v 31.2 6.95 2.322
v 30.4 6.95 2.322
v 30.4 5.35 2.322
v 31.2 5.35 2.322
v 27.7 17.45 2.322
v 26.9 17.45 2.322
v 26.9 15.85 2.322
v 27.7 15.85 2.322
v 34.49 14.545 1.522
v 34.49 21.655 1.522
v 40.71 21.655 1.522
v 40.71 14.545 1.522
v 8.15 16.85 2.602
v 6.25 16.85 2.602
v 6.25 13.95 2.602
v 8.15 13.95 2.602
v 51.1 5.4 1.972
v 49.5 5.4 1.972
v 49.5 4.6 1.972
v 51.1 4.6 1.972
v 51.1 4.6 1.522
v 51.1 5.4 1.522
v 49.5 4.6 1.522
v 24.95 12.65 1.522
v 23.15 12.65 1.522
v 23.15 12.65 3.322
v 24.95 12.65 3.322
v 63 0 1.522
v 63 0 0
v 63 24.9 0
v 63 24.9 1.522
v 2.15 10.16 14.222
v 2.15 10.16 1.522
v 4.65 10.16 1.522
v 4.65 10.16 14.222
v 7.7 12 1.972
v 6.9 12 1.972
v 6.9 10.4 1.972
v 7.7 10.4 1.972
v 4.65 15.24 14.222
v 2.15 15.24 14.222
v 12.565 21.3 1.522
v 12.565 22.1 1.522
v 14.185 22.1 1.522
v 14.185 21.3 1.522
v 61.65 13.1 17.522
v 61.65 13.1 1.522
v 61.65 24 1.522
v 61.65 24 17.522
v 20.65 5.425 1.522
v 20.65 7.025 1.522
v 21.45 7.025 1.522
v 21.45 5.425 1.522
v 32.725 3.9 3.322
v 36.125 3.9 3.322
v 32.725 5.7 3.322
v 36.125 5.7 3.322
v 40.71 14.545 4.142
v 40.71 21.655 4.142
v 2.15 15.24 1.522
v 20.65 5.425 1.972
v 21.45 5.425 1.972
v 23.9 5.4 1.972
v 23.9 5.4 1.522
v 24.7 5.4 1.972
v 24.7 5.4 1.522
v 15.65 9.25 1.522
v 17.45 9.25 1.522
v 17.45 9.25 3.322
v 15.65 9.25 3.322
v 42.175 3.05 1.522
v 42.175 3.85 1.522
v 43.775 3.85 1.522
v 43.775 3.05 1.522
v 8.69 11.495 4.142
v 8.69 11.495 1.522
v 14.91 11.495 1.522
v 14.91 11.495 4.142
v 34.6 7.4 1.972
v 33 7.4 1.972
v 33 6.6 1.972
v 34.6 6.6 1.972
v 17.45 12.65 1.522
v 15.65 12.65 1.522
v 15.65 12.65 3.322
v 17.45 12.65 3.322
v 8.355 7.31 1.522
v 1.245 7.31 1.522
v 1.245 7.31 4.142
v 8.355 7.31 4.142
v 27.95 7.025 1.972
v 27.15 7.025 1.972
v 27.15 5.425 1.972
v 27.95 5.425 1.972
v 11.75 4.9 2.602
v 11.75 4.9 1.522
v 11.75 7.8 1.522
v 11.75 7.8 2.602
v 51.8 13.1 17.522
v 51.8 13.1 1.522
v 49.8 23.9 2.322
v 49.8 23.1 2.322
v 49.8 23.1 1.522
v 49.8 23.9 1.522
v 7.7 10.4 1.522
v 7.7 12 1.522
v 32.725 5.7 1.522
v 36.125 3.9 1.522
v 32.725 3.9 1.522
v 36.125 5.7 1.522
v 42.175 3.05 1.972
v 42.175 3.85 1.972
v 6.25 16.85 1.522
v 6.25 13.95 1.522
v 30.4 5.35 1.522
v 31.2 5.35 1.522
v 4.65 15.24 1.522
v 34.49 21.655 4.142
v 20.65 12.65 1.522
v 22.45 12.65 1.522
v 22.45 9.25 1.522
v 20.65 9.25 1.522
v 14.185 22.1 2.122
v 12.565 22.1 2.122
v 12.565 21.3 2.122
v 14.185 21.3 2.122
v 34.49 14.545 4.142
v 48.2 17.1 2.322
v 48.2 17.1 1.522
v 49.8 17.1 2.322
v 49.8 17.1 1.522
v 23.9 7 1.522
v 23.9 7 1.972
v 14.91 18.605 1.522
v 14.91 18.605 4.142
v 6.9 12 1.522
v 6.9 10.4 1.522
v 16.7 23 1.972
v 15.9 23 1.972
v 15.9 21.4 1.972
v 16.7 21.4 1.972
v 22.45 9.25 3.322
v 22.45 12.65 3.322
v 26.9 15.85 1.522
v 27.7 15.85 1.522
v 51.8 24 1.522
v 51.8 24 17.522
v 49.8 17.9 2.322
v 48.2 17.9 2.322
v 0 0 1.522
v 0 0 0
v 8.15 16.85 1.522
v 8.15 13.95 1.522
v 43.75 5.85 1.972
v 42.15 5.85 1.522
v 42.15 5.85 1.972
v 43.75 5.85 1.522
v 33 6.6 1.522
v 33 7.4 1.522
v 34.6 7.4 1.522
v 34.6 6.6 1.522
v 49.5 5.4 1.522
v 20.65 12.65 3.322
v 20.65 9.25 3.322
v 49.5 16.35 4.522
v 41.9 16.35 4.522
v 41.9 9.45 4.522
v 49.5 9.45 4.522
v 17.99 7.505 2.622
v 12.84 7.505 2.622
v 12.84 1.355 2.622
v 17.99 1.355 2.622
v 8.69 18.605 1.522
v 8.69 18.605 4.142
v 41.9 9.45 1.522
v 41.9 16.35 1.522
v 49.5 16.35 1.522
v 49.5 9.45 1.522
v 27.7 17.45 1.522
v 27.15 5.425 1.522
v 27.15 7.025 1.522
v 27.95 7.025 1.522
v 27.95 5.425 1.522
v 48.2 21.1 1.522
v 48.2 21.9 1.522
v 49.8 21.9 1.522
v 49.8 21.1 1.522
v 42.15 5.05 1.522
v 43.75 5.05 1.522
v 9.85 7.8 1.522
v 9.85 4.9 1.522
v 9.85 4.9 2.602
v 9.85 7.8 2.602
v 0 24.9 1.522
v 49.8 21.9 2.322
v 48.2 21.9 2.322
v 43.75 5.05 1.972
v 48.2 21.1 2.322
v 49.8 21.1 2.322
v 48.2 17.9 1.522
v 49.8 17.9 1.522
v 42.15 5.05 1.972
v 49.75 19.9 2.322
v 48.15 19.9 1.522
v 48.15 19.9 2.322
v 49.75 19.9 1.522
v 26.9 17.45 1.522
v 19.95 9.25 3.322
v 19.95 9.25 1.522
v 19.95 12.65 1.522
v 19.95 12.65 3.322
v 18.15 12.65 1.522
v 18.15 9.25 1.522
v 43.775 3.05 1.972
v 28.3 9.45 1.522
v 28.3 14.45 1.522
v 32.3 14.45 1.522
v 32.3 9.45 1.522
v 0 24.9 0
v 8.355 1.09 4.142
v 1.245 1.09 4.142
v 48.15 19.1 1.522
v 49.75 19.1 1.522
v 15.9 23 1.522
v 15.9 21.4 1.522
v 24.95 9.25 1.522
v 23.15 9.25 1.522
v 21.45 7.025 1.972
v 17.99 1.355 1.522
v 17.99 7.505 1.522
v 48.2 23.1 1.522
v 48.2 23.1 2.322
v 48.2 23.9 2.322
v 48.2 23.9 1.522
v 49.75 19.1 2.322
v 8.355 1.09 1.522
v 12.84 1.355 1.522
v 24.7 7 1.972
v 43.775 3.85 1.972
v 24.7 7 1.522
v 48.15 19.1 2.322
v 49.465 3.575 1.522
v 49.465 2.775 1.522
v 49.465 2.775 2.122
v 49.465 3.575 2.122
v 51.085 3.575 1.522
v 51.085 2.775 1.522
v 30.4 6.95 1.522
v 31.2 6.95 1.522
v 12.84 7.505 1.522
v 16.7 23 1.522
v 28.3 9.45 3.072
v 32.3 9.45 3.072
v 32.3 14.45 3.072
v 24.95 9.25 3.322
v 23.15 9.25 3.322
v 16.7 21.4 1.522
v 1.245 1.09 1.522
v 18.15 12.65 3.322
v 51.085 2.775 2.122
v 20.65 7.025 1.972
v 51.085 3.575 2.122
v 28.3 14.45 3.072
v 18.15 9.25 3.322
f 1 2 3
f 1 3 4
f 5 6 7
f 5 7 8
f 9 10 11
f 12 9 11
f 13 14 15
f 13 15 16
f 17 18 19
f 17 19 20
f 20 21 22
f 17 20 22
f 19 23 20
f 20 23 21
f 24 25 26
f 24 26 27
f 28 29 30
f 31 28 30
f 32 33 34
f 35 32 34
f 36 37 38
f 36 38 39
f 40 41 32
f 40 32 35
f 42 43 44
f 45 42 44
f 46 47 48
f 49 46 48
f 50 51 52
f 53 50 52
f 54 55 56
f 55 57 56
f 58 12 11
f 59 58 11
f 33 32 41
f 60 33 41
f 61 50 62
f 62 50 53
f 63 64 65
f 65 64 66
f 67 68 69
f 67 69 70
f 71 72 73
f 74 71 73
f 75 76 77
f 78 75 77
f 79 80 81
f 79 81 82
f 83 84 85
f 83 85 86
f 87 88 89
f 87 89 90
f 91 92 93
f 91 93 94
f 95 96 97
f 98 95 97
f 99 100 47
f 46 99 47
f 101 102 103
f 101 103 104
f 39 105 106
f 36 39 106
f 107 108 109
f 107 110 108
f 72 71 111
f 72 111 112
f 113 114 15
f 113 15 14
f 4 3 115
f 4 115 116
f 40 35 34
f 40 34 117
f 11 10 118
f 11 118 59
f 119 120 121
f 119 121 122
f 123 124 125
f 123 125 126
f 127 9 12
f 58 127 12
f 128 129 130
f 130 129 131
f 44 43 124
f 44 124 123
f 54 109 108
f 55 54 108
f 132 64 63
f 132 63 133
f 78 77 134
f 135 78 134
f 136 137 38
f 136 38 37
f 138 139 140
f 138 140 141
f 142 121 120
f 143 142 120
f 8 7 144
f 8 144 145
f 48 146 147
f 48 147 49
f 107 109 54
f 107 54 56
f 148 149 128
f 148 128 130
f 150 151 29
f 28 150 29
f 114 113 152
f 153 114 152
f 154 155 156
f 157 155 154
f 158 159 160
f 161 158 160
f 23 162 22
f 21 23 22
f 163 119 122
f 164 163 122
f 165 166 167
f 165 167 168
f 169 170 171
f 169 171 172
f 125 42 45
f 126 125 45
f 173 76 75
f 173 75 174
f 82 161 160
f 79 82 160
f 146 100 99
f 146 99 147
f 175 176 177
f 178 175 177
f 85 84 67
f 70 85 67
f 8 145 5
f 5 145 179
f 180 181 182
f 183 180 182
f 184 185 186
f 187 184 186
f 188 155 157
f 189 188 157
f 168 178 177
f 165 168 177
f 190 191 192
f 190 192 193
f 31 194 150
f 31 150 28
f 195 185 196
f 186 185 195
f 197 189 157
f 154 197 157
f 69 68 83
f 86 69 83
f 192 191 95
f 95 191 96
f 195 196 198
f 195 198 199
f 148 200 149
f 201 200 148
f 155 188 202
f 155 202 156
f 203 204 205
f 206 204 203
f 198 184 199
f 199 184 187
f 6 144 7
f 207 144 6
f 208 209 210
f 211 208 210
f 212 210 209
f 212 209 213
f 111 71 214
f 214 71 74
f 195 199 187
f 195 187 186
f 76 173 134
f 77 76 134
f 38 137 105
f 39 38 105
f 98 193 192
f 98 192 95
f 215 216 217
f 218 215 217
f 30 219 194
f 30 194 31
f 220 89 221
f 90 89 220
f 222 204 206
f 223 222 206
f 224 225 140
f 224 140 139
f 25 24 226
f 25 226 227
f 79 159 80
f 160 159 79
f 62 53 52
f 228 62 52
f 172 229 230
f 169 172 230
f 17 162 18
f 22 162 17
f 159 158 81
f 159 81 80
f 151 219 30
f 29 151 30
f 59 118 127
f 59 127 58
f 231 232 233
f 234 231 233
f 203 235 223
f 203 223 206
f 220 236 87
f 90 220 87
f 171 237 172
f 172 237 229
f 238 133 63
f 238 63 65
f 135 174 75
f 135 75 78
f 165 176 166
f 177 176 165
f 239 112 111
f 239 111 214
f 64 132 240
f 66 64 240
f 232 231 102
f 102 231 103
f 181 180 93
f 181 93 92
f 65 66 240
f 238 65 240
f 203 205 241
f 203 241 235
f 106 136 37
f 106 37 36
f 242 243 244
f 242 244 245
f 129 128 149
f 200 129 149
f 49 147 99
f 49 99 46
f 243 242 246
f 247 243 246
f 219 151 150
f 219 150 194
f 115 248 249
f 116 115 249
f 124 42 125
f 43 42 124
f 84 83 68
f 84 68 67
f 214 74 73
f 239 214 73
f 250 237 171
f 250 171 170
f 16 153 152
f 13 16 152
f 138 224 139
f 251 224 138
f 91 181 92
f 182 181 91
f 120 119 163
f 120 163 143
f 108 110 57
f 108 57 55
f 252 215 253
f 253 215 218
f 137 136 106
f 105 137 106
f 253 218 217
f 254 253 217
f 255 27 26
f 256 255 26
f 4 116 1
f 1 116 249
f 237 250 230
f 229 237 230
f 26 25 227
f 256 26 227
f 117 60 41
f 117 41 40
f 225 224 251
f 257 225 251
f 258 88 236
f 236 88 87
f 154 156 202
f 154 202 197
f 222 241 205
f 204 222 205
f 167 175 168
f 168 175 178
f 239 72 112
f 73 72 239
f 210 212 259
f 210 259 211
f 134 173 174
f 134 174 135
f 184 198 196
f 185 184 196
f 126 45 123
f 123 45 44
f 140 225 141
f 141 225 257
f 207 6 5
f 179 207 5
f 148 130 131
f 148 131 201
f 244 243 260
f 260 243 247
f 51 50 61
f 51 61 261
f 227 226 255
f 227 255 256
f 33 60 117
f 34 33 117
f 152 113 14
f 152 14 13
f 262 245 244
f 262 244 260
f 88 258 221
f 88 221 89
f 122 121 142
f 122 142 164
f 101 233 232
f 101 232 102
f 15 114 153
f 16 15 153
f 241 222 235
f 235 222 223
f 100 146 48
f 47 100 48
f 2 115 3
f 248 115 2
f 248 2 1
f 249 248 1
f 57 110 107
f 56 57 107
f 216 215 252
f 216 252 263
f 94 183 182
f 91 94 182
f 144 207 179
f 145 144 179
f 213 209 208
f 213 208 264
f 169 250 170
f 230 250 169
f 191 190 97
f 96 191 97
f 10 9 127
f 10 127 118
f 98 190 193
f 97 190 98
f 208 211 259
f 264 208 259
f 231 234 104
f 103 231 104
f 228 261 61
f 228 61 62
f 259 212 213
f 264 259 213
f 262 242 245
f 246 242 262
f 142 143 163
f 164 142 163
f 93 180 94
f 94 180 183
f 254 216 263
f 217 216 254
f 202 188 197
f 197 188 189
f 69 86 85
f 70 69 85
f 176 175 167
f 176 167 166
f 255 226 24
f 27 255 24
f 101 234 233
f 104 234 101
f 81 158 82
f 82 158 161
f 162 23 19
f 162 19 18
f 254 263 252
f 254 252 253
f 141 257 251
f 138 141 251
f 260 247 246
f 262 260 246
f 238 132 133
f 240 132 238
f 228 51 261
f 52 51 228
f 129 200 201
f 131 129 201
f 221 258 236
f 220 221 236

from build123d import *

# Parameters (mm, degrees)
SKETCH_1_W                  = 63
SKETCH_1_H                  = 24.9
BOARD_DEPTH                 = 1.522
SKETCH_2_W                  = 2.5
SKETCH_2_H                  = 5.08
TE_826629_2_1_DEPTH         = 12.7
EXTRUDE_C1206_1_DEPTH       = 1.8
SKETCH_4_W                  = 1.9
SKETCH_4_H                  = 2.9
DO_219AB_1_DEPTH            = 1.08
EXTRUDE_C1206_2_DEPTH       = 1.8
SKETCH_6_W                  = 0.8
SKETCH_6_H                  = 1.6001
EXTRUDE_C0603_1_DEPTH       = 0.8
SKETCH_7_W                  = 9.85
SKETCH_7_H                  = 10.9
EXTRUDE_4_1775099_0_1_DEPTH = 16
SKETCH_8_W                  = 5.15
SKETCH_8_H                  = 6.15
SON_8_1_DEPTH               = 1.1
SKETCH_9_W                  = 6.22
SKETCH_9_H                  = 7.11
DO_214AB_1_DEPTH            = 2.62
SKETCH_10_W                 = 7.11
SKETCH_10_H                 = 6.22
DO_214AB_2_DEPTH            = 2.62
SKETCH_11_W                 = 1.9
SKETCH_11_H                 = 2.9
DO_219AB_2_DEPTH            = 1.08
SKETCH_12_W                 = 6.22
SKETCH_12_H                 = 7.11
DO_214AB_3_DEPTH            = 2.62
SKETCH_13_W                 = 1.6
SKETCH_13_H                 = 0.8
EXTRUDE_R0603_1_DEPTH       = 0.45
SKETCH_14_W                 = 1.6
SKETCH_14_H                 = 0.8
EXTRUDE_R0603_2_DEPTH       = 0.45
SKETCH_15_W                 = 1.6
SKETCH_15_H                 = 0.8
EXTRUDE_R0603_3_DEPTH       = 0.45
SKETCH_16_W                 = 1.6
SKETCH_16_H                 = 0.8
EXTRUDE_R0603_4_DEPTH       = 0.45
SKETCH_17_W                 = 0.8
SKETCH_17_H                 = 1.6
EXTRUDE_R0603_5_DEPTH       = 0.45
SKETCH_18_W                 = 0.8
SKETCH_18_H                 = 1.6
EXTRUDE_R0603_6_DEPTH       = 0.45
SKETCH_19_W                 = 0.8
SKETCH_19_H                 = 1.6
EXTRUDE_R0603_7_DEPTH       = 0.45
SKETCH_20_W                 = 0.8
SKETCH_20_H                 = 1.6
EXTRUDE_R0603_8_DEPTH       = 0.45
SKETCH_21_W                 = 0.8
SKETCH_21_H                 = 1.6
EXTRUDE_R0603_9_DEPTH       = 0.45
SKETCH_22_W                 = 7.6
SKETCH_22_H                 = 6.9
SRP_2_670X660X280_1_DEPTH   = 3
SKETCH_23_W                 = 1.6201
SKETCH_23_H                 = 0.8
HL0603_1_DEPTH              = 0.6
SKETCH_24_W                 = 1.6201
SKETCH_24_H                 = 0.8
HL0603_2_DEPTH              = 0.6
SKETCH_25_W                 = 4
SKETCH_25_H                 = 5
HSOIC_8_1_DEPTH             = 1.55
SKETCH_26_W                 = 1.6001
SKETCH_26_H                 = 0.8
EXTRUDE_C0603_2_DEPTH       = 0.8
SKETCH_27_W                 = 1.6001
SKETCH_27_H                 = 0.8
EXTRUDE_C0603_3_DEPTH       = 0.8
SKETCH_28_W                 = 1.6001
SKETCH_28_H                 = 0.8
EXTRUDE_C0603_4_DEPTH       = 0.8
SKETCH_29_W                 = 1.6001
SKETCH_29_H                 = 0.8
EXTRUDE_C0603_5_DEPTH       = 0.8
SKETCH_30_W                 = 0.8
SKETCH_30_H                 = 1.6001
EXTRUDE_C0603_6_DEPTH       = 0.8
EXTRUDE_C1206_3_DEPTH       = 1.8
EXTRUDE_C1206_4_DEPTH       = 1.8
EXTRUDE_C1206_5_DEPTH       = 1.8


with BuildPart() as part:
    # Эскиз1 → BOARD (new body)
    with BuildSketch(Plane.XY):
        with Locations((31.5, 12.45)):
            Rectangle(SKETCH_1_W, SKETCH_1_H)
    extrude(amount=BOARD_DEPTH)


with BuildPart() as body_2:
    # Эскиз2 → TE_826629-2-1 (new body)
    with BuildSketch(Plane.XY.offset(1.522)):
        with Locations((3.4002, 12.6998)):
            Rectangle(SKETCH_2_W, SKETCH_2_H)
    extrude(amount=TE_826629_2_1_DEPTH)


with BuildPart() as body_3:
    # Эскиз3 → C1206-1 (new body)
    with BuildSketch(Plane.XY.offset(1.522)):
        Polygon((19.95, 11.85), (19.95, 10.05), (19.95, 9.25), (18.15, 9.25), (18.15, 10.05), (18.15, 11.85), (18.15, 12.65), (19.95, 12.65), align=None)
    extrude(amount=EXTRUDE_C1206_1_DEPTH)


with BuildPart() as body_4:
    # Эскиз4 → DO-219AB-1 (new body)
    with BuildSketch(Plane.XY.offset(1.522)):
        with Locations((7.2, 15.4)):
            Rectangle(SKETCH_4_W, SKETCH_4_H)
    extrude(amount=DO_219AB_1_DEPTH)


with BuildPart() as body_5:
    # Эскиз5 → C1206-2 (new body)
    with BuildSketch(Plane.XY.offset(1.522)):
        Polygon((35.325, 3.9), (33.525, 3.9), (32.725, 3.9), (32.725, 5.7), (33.525, 5.7), (35.325, 5.7), (36.125, 5.7), (36.125, 3.9), align=None)
    extrude(amount=EXTRUDE_C1206_2_DEPTH)


with BuildPart() as body_6:
    # Эскиз6 → C0603-1 (new body)
    with BuildSketch(Plane.XY.offset(1.522)):
        with Locations((30.8002, 6.14985)):
            Rectangle(SKETCH_6_W, SKETCH_6_H)
    extrude(amount=EXTRUDE_C0603_1_DEPTH)


with BuildPart() as body_7:
    # Эскиз7 → 4-1775099-0-1 (new body)
    with BuildSketch(Plane.XY.offset(1.522)):
        with Locations((56.7251, 18.5501)):
            Rectangle(SKETCH_7_W, SKETCH_7_H)
    extrude(amount=EXTRUDE_4_1775099_0_1_DEPTH)


with BuildPart() as body_8:
    # Эскиз8 → SON-8-1 (new body)
    with BuildSketch(Plane.XY.offset(1.522)):
        with Locations((15.415, 4.43)):
            Rectangle(SKETCH_8_W, SKETCH_8_H)
    extrude(amount=SON_8_1_DEPTH)


with BuildPart() as body_9:
    # Эскиз9 → DO-214AB-1 (new body)
    with BuildSketch(Plane.XY.offset(1.522)):
        with Locations((37.6, 18.1)):
            Rectangle(SKETCH_9_W, SKETCH_9_H)
    extrude(amount=DO_214AB_1_DEPTH)


with BuildPart() as body_10:
    # Эскиз10 → DO-214AB-2 (new body)
    with BuildSketch(Plane.XY.offset(1.522)):
        with Locations((4.8, 4.2)):
            Rectangle(SKETCH_10_W, SKETCH_10_H)
    extrude(amount=DO_214AB_2_DEPTH)


with BuildPart() as body_11:
    # Эскиз11 → DO-219AB-2 (new body)
    with BuildSketch(Plane.XY.offset(1.522)):
        with Locations((10.8, 6.35)):
            Rectangle(SKETCH_11_W, SKETCH_11_H)
    extrude(amount=DO_219AB_2_DEPTH)


with BuildPart() as body_12:
    # Эскиз12 → DO-214AB-3 (new body)
    with BuildSketch(Plane.XY.offset(1.522)):
        with Locations((11.8, 15.05)):
            Rectangle(SKETCH_12_W, SKETCH_12_H)
    extrude(amount=DO_214AB_3_DEPTH)


with BuildPart() as body_13:
    # Эскиз13 → R0603-1 (new body)
    with BuildSketch(Plane.XY.offset(1.522)):
        with Locations((50.2999, 5.0001)):
            Rectangle(SKETCH_13_W, SKETCH_13_H)
    extrude(amount=EXTRUDE_R0603_1_DEPTH)


with BuildPart() as body_14:
    # Эскиз14 → R0603-2 (new body)
    with BuildSketch(Plane.XY.offset(1.522)):
        with Locations((42.9499, 5.4501)):
            Rectangle(SKETCH_14_W, SKETCH_14_H)
    extrude(amount=EXTRUDE_R0603_2_DEPTH)


with BuildPart() as body_15:
    # Эскиз15 → R0603-3 (new body)
    with BuildSketch(Plane.XY.offset(1.522)):
        with Locations((42.9751, 3.4499)):
            Rectangle(SKETCH_15_W, SKETCH_15_H)
    extrude(amount=EXTRUDE_R0603_3_DEPTH)


with BuildPart() as body_16:
    # Эскиз16 → R0603-4 (new body)
    with BuildSketch(Plane.XY.offset(1.522)):
        with Locations((33.7999, 7.0001)):
            Rectangle(SKETCH_16_W, SKETCH_16_H)
    extrude(amount=EXTRUDE_R0603_4_DEPTH)


with BuildPart() as body_17:
    # Эскиз17 → R0603-5 (new body)
    with BuildSketch(Plane.XY.offset(1.522)):
        with Locations((27.5501, 6.2251)):
            Rectangle(SKETCH_17_W, SKETCH_17_H)
    extrude(amount=EXTRUDE_R0603_5_DEPTH)


with BuildPart() as body_18:
    # Эскиз18 → R0603-6 (new body)
    with BuildSketch(Plane.XY.offset(1.522)):
        with Locations((21.0499, 6.2249)):
            Rectangle(SKETCH_18_W, SKETCH_18_H)
    extrude(amount=EXTRUDE_R0603_6_DEPTH)


with BuildPart() as body_19:
    # Эскиз19 → R0603-7 (new body)
    with BuildSketch(Plane.XY.offset(1.522)):
        with Locations((24.3001, 6.2001)):
            Rectangle(SKETCH_19_W, SKETCH_19_H)
    extrude(amount=EXTRUDE_R0603_7_DEPTH)


with BuildPart() as body_20:
    # Эскиз20 → R0603-8 (new body)
    with BuildSketch(Plane.XY.offset(1.522)):
        with Locations((7.3001, 11.2001)):
            Rectangle(SKETCH_20_W, SKETCH_20_H)
    extrude(amount=EXTRUDE_R0603_8_DEPTH)


with BuildPart() as body_21:
    # Эскиз21 → R0603-9 (new body)
    with BuildSketch(Plane.XY.offset(1.522)):
        with Locations((16.2999, 22.1999)):
            Rectangle(SKETCH_21_W, SKETCH_21_H)
    extrude(amount=EXTRUDE_R0603_9_DEPTH)


with BuildPart() as body_22:
    # Эскиз22 → SRP-2-670X660X280-1 (new body)
    with BuildSketch(Plane.XY.offset(1.522)):
        with Locations((45.7, 12.9)):
            Rectangle(SKETCH_22_W, SKETCH_22_H)
    extrude(amount=SRP_2_670X660X280_1_DEPTH)


with BuildPart() as body_23:
    # Эскиз23 → HL0603-1 (new body)
    with BuildSketch(Plane.XY.offset(1.522)):
        with Locations((50.27505, 3.1749)):
            Rectangle(SKETCH_23_W, SKETCH_23_H)
    extrude(amount=HL0603_1_DEPTH)


with BuildPart() as body_24:
    # Эскиз24 → HL0603-2 (new body)
    with BuildSketch(Plane.XY.offset(1.522)):
        with Locations((13.37505, 21.6999)):
            Rectangle(SKETCH_24_W, SKETCH_24_H)
    extrude(amount=HL0603_2_DEPTH)


with BuildPart() as body_25:
    # Эскиз25 → HSOIC-8-1 (new body)
    with BuildSketch(Plane.XY.offset(1.522)):
        with Locations((30.3, 11.95)):
            Rectangle(SKETCH_25_W, SKETCH_25_H)
    extrude(amount=HSOIC_8_1_DEPTH)


with BuildPart() as body_26:
    # Эскиз26 → C0603-2 (new body)
    with BuildSketch(Plane.XY.offset(1.522)):
        with Locations((48.99985, 23.4998)):
            Rectangle(SKETCH_26_W, SKETCH_26_H)
    extrude(amount=EXTRUDE_C0603_2_DEPTH)


with BuildPart() as body_27:
    # Эскиз27 → C0603-3 (new body)
    with BuildSketch(Plane.XY.offset(1.522)):
        with Locations((48.99985, 21.4998)):
            Rectangle(SKETCH_27_W, SKETCH_27_H)
    extrude(amount=EXTRUDE_C0603_3_DEPTH)


with BuildPart() as body_28:
    # Эскиз28 → C0603-4 (new body)
    with BuildSketch(Plane.XY.offset(1.522)):
        with Locations((48.94985, 19.4998)):
            Rectangle(SKETCH_28_W, SKETCH_28_H)
    extrude(amount=EXTRUDE_C0603_4_DEPTH)


with BuildPart() as body_29:
    # Эскиз29 → C0603-5 (new body)
    with BuildSketch(Plane.XY.offset(1.522)):
        with Locations((48.99985, 17.4998)):
            Rectangle(SKETCH_29_W, SKETCH_29_H)
    extrude(amount=EXTRUDE_C0603_5_DEPTH)


with BuildPart() as body_30:
    # Эскиз30 → C0603-6 (new body)
    with BuildSketch(Plane.XY.offset(1.522)):
        with Locations((27.2998, 16.65015)):
            Rectangle(SKETCH_30_W, SKETCH_30_H)
    extrude(amount=EXTRUDE_C0603_6_DEPTH)


with BuildPart() as body_31:
    # Эскиз31 → C1206-3 (new body)
    with BuildSketch(Plane.XY.offset(1.522)):
        Polygon((24.95, 11.85), (24.95, 10.05), (24.95, 9.25), (23.15, 9.25), (23.15, 10.05), (23.15, 11.85), (23.15, 12.65), (24.95, 12.65), align=None)
    extrude(amount=EXTRUDE_C1206_3_DEPTH)


with BuildPart() as body_32:
    # Эскиз32 → C1206-4 (new body)
    with BuildSketch(Plane.XY.offset(1.522)):
        Polygon((22.45, 11.85), (22.45, 10.05), (22.45, 9.25), (20.65, 9.25), (20.65, 10.05), (20.65, 11.85), (20.65, 12.65), (22.45, 12.65), align=None)
    extrude(amount=EXTRUDE_C1206_4_DEPTH)


with BuildPart() as body_33:
    # Эскиз33 → C1206-5 (new body)
    with BuildSketch(Plane.XY.offset(1.522)):
        Polygon((17.45, 11.85), (17.45, 10.05), (17.45, 9.25), (15.65, 9.25), (15.65, 10.05), (15.65, 11.85), (15.65, 12.65), (17.45, 12.65), align=None)
    extrude(amount=EXTRUDE_C1206_5_DEPTH)


solid = Compound([part.part, body_2.part, body_3.part, body_4.part, body_5.part, body_6.part, body_7.part, body_8.part, body_9.part, body_10.part, body_11.part, body_12.part, body_13.part, body_14.part, body_15.part, body_16.part, body_17.part, body_18.part, body_19.part, body_20.part, body_21.part, body_22.part, body_23.part, body_24.part, body_25.part, body_26.part, body_27.part, body_28.part, body_29.part, body_30.part, body_31.part, body_32.part, body_33.part])
